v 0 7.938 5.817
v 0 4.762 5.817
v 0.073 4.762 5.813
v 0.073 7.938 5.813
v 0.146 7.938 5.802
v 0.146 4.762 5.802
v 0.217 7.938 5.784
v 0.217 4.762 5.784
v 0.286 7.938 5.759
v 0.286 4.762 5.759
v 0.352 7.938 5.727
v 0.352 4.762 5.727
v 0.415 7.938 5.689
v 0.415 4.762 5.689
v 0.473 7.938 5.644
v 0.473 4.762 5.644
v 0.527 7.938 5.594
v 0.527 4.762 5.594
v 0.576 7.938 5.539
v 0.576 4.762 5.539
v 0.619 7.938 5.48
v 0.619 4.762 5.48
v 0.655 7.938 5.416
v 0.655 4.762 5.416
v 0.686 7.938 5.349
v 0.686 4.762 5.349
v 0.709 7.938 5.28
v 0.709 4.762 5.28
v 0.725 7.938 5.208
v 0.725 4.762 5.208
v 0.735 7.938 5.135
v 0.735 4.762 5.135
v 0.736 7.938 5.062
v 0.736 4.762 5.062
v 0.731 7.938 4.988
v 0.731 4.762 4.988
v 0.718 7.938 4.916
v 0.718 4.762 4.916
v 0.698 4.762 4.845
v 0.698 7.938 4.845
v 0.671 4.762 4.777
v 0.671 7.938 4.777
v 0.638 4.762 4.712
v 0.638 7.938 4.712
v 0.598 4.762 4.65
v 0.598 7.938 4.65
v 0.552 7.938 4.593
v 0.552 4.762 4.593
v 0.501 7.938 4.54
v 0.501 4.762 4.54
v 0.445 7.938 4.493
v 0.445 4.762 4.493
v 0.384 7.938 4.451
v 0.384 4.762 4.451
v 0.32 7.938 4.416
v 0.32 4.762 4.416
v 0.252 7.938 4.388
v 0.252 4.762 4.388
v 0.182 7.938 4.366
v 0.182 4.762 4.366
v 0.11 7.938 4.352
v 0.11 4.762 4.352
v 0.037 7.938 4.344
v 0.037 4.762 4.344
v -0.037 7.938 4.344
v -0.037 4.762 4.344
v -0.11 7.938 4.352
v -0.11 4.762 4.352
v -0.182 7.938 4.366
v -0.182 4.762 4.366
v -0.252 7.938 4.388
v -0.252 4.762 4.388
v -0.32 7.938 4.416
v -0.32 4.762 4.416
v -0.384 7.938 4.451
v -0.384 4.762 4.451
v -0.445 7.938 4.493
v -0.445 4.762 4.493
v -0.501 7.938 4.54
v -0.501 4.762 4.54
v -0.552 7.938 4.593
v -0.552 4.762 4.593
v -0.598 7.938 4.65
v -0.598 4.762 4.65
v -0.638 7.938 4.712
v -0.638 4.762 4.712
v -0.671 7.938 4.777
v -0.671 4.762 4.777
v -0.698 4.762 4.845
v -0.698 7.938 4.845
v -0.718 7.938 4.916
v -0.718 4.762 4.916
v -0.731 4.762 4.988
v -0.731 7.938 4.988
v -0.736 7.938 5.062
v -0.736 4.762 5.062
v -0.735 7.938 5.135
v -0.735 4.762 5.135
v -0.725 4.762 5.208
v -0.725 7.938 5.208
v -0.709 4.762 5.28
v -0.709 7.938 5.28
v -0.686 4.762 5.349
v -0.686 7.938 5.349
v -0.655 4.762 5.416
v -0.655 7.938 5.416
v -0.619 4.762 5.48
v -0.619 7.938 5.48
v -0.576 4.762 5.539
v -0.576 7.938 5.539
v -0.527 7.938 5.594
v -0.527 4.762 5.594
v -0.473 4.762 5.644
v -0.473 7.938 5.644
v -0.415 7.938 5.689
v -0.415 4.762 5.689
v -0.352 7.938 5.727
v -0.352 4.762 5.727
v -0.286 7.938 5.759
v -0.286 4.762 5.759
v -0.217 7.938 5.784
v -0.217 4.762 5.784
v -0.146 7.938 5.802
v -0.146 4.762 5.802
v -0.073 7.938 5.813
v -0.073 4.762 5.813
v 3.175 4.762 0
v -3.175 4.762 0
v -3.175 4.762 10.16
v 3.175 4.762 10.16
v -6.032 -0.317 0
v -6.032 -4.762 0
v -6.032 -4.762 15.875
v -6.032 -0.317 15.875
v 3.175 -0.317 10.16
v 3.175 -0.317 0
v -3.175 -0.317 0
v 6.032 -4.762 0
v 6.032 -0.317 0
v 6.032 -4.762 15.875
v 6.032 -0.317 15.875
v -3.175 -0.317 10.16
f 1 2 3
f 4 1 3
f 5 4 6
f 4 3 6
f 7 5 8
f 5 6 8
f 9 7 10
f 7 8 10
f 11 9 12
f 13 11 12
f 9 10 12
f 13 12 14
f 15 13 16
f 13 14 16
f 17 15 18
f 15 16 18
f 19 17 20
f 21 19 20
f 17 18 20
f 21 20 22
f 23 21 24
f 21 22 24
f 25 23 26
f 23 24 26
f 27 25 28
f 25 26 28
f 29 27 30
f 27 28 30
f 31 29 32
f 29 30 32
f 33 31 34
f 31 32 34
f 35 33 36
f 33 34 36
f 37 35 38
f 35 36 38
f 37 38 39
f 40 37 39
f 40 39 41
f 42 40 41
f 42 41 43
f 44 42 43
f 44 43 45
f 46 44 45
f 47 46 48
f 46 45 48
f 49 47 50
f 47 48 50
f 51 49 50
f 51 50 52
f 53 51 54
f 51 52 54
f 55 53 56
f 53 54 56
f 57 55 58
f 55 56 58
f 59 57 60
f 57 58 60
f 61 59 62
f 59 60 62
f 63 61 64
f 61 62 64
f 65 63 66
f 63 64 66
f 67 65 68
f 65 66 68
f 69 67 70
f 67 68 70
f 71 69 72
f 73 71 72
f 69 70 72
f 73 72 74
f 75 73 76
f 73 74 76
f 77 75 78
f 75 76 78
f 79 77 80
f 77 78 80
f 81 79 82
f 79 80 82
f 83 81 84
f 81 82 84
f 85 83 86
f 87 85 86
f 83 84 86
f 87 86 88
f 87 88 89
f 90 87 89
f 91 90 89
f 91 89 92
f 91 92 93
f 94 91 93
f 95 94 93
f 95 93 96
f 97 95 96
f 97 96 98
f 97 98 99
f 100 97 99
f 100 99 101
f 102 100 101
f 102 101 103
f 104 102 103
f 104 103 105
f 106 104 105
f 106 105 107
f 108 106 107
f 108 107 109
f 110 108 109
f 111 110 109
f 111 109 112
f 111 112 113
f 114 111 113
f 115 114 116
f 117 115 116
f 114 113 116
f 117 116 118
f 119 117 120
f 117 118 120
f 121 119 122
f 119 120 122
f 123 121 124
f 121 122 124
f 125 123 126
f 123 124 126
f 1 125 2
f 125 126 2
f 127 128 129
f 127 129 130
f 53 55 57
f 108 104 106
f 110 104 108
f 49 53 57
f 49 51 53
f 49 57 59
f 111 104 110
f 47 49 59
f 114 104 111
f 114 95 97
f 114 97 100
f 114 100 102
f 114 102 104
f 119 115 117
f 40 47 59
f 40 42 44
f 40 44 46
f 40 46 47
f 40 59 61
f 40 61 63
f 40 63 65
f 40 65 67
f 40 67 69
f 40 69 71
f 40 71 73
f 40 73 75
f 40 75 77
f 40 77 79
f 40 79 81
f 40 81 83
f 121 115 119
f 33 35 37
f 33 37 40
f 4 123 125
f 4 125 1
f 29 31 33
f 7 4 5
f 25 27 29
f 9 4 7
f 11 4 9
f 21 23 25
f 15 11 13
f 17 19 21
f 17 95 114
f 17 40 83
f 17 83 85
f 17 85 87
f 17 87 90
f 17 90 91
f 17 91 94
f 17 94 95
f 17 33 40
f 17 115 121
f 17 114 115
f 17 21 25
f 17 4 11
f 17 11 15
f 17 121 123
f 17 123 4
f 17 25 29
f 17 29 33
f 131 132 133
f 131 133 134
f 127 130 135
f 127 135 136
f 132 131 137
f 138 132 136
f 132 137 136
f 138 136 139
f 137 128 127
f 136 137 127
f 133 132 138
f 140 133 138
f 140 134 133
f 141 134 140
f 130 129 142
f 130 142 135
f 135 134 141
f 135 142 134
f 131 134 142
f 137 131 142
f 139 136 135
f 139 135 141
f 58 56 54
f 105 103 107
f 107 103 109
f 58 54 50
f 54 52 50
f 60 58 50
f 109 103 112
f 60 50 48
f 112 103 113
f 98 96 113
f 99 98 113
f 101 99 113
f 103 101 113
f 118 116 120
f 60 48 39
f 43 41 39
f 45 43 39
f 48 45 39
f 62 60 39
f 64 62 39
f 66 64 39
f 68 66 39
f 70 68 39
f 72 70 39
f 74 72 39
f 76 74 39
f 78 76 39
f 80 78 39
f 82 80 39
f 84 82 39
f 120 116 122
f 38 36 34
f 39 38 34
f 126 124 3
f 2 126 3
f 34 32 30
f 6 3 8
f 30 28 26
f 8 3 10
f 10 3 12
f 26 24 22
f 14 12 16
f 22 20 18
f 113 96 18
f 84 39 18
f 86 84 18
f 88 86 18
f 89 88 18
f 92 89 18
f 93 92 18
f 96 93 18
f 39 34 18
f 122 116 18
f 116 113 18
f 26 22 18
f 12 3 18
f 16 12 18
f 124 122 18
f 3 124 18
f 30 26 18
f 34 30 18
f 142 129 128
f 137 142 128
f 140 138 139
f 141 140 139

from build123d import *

# Parameters (mm, degrees)
SKETCH1_W           = 12.065
SKETCH1_H           = 9.525
BASE_DEPTH          = 15.875
SKETCH7_W           = 18.144441676
SKETCH7_H           = 22.667604572
SKETCH7_W_2         = 6.35
SKETCH7_H_2         = 10.16
CUT_EXTRUDE1_DEPTH  = 5.08
SKETCH8_R           = 0.7366
BOSS_EXTRUDE1_DEPTH = 3.175


with BuildPart() as part:
    # Sketch1 → Base (new body)
    with BuildSketch(Plane.XY):
        Rectangle(SKETCH1_W, SKETCH1_H)
    extrude(amount=BASE_DEPTH)

    # Sketch7 → Cut-Extrude1 (cut)
    with BuildSketch(Plane(origin=(0, 4.7625, 0), x_dir=(1, 0, 0), z_dir=(0, 1, 0))):
        with Locations((0.669483701, -7.615912702)):
            Rectangle(SKETCH7_W, SKETCH7_H)
        with Locations((0, -5.08)):
            Rectangle(SKETCH7_W_2, SKETCH7_H_2, mode=Mode.SUBTRACT)
    extrude(amount=-CUT_EXTRUDE1_DEPTH, mode=Mode.SUBTRACT)


with BuildPart() as body_2:
    # Sketch8 → Boss-Extrude1 (new body)
    with BuildSketch(Plane(origin=(0, 4.7625, 0), x_dir=(1, 0, 0), z_dir=(0, 1, 0))):
        with Locations(Location((0, -5.08, 0), (0, 0, 270))):
            Circle(SKETCH8_R)
    extrude(amount=BOSS_EXTRUDE1_DEPTH)


solid = Compound([part.part, body_2.part])
